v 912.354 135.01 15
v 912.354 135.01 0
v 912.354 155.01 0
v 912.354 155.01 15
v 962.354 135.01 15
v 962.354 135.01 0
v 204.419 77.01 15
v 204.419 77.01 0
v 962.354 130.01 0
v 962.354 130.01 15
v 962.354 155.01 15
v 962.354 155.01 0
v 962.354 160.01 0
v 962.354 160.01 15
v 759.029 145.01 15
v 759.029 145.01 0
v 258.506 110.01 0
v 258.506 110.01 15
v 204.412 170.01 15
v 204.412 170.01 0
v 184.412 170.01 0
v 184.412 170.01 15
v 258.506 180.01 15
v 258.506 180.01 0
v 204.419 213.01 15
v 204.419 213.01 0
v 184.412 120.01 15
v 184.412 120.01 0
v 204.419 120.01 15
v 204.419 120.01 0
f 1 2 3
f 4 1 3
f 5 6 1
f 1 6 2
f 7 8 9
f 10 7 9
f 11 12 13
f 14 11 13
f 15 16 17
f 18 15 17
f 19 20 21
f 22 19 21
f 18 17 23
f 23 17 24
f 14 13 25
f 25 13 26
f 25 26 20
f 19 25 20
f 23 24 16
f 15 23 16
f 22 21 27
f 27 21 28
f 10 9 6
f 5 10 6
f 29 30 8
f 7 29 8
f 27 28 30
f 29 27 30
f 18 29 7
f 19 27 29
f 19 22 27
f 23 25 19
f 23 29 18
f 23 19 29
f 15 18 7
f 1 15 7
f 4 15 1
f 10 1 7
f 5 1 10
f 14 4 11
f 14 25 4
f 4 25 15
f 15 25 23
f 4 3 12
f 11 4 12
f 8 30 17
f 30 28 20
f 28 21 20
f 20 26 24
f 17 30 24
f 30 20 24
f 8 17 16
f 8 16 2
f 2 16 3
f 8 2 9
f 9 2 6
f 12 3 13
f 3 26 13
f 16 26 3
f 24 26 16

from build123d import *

# Parameters (mm, degrees)
EXTRUDE_1_DEPTH = 15


with BuildPart() as part:
    # Model → 凸台-拉伸1 (new body)
    with BuildSketch(Plane.XY):
        Polygon((184.411857588, 120.010493647), (204.418760095, 120.010493647), (204.418760095, 77.010493647), (962.354071701, 130.010493647), (962.354071701, 135.010493647), (912.354071701, 135.010493647), (912.354071701, 155.010493647), (962.354067739, 155.010493647), (962.354063778, 160.010493647), (204.418760095, 213.010493093), (204.411857588, 170.010493647), (184.411857588, 170.010493647), align=None)
        Polygon((258.506130737, 110.010493647), (258.506130737, 180.010493647), (759.029449722, 145.010493647), align=None, mode=Mode.SUBTRACT)
    extrude(amount=EXTRUDE_1_DEPTH)


solid = part.part
